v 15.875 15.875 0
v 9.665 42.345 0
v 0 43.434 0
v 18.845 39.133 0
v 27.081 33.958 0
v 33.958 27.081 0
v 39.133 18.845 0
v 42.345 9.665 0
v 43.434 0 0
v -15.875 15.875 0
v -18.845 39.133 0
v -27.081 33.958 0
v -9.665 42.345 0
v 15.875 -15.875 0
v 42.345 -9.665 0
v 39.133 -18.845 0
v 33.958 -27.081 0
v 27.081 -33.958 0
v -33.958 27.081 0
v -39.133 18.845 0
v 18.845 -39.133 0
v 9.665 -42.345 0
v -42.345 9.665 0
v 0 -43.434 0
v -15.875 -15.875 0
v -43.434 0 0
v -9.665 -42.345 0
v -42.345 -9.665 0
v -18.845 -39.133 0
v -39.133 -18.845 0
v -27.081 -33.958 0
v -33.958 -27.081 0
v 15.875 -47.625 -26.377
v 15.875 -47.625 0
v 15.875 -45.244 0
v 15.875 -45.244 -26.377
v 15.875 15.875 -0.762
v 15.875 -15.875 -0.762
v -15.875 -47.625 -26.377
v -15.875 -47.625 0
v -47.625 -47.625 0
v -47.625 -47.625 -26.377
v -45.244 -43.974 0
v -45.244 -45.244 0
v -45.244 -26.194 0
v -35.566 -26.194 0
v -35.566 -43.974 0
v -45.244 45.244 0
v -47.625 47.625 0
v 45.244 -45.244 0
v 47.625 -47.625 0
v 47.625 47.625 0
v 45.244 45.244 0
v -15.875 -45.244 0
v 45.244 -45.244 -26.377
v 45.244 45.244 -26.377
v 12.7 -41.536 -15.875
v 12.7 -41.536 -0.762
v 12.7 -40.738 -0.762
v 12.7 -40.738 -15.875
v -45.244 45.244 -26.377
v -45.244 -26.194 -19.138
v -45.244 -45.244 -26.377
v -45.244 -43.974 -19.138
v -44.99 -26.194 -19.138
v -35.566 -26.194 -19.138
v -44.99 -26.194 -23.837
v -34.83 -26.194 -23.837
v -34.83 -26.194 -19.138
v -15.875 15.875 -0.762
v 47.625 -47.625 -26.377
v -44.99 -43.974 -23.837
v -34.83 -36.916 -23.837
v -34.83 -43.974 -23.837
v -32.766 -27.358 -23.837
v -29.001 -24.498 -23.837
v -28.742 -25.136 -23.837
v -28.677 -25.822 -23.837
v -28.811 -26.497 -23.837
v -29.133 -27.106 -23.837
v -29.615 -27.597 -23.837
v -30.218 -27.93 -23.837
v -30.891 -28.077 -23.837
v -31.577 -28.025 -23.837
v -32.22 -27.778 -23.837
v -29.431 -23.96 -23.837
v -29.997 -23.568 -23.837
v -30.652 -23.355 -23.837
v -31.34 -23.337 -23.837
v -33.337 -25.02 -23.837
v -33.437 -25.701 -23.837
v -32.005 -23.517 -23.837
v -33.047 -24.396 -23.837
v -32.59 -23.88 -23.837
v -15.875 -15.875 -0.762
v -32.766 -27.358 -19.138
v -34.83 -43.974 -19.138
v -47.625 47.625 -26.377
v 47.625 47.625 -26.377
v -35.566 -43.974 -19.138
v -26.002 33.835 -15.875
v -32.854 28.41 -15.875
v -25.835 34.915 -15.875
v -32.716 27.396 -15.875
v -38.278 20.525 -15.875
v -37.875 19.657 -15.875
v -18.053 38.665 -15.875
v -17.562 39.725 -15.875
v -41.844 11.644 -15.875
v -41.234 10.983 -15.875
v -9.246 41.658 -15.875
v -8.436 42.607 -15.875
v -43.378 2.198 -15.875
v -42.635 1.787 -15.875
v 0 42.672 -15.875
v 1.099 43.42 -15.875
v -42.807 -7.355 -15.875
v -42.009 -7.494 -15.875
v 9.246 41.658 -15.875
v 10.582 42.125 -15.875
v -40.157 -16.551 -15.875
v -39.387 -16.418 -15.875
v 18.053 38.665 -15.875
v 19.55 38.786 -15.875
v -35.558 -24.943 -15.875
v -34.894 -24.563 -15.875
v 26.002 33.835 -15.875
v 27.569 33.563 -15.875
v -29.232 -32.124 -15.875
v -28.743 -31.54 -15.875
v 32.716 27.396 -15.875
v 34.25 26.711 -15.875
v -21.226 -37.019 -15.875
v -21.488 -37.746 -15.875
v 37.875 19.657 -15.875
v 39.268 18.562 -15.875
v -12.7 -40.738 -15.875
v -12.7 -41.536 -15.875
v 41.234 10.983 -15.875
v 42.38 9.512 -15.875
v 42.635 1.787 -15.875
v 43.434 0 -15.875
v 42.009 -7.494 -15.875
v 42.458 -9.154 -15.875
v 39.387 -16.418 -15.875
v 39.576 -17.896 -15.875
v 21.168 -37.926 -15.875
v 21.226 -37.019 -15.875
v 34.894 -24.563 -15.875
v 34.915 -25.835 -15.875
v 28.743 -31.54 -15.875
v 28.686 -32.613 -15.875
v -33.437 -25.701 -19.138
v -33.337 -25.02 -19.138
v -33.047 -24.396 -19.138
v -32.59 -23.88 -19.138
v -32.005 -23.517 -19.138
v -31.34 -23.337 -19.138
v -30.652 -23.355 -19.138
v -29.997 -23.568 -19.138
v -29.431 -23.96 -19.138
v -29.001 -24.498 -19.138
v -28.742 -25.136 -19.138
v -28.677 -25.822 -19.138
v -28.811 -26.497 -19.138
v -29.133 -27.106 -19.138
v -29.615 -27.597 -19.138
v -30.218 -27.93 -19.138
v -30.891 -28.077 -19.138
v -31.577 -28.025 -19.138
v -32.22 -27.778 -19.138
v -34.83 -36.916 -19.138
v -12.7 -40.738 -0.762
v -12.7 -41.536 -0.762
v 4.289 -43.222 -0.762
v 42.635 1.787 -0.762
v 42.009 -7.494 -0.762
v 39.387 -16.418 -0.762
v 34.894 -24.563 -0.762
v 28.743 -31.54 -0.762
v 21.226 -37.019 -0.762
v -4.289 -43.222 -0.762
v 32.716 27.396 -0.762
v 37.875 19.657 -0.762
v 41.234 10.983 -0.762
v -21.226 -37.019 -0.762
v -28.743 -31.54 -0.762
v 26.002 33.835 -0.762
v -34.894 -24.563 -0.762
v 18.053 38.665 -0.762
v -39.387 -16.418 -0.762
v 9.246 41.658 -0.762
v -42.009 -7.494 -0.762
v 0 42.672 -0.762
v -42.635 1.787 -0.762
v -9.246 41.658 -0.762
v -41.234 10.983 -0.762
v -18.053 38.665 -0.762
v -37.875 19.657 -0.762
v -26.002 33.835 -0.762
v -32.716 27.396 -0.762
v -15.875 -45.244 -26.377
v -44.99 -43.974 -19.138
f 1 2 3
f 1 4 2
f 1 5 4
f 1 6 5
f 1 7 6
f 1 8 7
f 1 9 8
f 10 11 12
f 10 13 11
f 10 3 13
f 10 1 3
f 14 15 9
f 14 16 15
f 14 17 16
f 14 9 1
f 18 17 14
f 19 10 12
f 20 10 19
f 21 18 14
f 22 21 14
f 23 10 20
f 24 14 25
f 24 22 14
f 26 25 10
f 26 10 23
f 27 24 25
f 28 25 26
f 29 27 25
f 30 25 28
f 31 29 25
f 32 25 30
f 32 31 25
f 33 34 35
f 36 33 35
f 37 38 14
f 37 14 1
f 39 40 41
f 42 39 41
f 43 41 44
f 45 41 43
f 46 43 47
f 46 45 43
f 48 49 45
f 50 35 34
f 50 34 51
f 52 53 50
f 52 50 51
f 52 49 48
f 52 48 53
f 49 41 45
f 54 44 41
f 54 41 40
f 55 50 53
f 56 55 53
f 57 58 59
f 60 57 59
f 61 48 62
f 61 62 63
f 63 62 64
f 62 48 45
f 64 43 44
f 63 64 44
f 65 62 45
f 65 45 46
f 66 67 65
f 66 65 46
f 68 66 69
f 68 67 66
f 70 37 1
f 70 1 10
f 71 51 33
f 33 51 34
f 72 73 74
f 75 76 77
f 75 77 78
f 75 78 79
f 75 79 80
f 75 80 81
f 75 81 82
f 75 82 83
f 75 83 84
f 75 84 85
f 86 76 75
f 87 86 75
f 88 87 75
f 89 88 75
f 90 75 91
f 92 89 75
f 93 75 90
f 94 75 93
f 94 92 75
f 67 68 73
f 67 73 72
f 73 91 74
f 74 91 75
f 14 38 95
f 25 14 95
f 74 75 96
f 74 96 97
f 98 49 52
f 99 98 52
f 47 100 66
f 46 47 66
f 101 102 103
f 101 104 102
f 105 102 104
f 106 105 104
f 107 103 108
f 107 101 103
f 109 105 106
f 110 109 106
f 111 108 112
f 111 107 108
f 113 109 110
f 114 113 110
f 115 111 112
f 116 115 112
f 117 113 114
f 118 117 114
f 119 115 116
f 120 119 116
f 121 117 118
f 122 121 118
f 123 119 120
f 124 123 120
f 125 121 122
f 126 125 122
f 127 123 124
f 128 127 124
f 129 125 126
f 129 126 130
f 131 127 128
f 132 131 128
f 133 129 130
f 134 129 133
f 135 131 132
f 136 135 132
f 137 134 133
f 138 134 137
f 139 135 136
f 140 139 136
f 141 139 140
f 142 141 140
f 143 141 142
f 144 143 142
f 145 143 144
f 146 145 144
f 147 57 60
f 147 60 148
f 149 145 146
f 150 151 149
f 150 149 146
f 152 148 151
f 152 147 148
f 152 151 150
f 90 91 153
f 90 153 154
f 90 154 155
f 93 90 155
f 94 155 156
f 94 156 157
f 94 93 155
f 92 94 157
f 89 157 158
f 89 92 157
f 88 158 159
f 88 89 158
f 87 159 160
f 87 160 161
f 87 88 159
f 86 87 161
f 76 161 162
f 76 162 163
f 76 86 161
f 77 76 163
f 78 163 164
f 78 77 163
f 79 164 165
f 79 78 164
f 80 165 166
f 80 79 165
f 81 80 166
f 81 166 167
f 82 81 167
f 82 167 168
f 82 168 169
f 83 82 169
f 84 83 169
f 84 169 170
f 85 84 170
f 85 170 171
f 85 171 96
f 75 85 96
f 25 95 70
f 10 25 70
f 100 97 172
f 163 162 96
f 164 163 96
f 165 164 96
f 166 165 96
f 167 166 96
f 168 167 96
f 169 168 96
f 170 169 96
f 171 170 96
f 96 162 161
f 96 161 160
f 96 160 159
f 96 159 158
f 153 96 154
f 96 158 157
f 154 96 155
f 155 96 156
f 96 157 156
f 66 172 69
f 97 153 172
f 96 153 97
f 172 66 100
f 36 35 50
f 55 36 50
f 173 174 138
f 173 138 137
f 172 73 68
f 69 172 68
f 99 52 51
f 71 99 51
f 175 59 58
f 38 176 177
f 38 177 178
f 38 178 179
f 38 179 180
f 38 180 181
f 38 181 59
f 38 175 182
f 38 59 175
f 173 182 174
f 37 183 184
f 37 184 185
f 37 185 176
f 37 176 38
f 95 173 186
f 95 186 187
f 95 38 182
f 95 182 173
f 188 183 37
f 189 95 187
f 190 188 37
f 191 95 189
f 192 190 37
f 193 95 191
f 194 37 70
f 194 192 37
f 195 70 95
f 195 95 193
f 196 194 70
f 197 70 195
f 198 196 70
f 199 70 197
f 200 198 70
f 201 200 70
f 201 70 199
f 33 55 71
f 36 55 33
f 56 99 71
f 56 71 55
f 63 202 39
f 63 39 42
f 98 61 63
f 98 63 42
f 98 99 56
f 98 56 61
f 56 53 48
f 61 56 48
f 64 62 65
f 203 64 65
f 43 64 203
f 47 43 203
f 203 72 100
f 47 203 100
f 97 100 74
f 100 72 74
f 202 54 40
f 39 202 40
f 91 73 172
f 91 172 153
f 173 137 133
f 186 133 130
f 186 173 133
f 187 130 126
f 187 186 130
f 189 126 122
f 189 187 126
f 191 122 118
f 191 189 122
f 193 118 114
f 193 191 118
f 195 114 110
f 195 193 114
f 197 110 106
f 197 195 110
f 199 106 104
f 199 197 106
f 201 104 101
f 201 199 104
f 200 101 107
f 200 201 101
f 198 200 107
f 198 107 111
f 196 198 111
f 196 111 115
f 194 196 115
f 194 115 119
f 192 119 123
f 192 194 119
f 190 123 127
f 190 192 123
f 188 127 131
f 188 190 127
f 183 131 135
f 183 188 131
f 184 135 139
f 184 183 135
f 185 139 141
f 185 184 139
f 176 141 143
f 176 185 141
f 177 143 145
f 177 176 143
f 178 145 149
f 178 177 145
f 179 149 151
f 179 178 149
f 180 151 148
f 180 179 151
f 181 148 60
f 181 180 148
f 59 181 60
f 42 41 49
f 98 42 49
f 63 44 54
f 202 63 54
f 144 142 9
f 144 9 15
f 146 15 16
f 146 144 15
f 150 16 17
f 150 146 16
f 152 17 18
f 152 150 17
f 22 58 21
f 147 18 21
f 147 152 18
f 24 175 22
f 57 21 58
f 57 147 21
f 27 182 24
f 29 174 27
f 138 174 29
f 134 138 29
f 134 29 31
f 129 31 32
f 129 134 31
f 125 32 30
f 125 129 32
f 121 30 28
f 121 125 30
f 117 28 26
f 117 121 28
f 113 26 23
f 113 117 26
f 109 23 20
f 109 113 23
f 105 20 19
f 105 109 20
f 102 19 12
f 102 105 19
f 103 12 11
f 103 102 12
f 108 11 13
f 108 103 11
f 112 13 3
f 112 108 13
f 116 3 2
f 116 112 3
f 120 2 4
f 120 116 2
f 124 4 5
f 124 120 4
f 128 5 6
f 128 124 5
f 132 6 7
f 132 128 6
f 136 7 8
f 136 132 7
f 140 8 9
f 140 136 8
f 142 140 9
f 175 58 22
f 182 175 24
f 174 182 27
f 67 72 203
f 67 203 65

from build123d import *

# Parameters (mm, degrees)
SKETCH3_W           = 31.75
SKETCH3_H           = 31.75
CUT_EXTRUDE1_DEPTH  = 1.762
SKETCH4_W           = 25.4
SKETCH4_H           = 50.8
CUT_EXTRUDE2_DEPTH  = 16.113
BOSS_EXTRUDE2_DEPTH = 26.376923077
BOSS_EXTRUDE3_START = -2.54
SKETCH6_W           = 10.16
SKETCH6_H           = 17.78
SKETCH6_R           = 2.38125
BOSS_EXTRUDE3_DEPTH = 4.699
SKETCH7_W           = 9.677573941
SKETCH7_H           = 17.78
BOSS_EXTRUDE4_DEPTH = 19.137923


with BuildPart() as part:
    # Sketch2 → Revolve1 (revolve)
    with BuildSketch(Plane(origin=(0, 0, 0), x_dir=(1, 0, 0), z_dir=(0, 1, 0))):
        Polygon((0, 0), (43.434, 0), (43.434, 15.875), (42.672, 15.875), (42.672, 0.762), (0, 0.762), align=None)
    revolve(axis=Axis((0, 0, 0), (0, 0, -1)))

    # Sketch3 → Cut-Extrude1 (cut, through all)
    with BuildSketch(Plane(origin=(0, 0, -0.762), x_dir=(-1, 0, 0), z_dir=(0, 0, -1))):
        Rectangle(SKETCH3_W, SKETCH3_H)
    extrude(amount=-CUT_EXTRUDE1_DEPTH, mode=Mode.SUBTRACT)

    # Sketch4 → Cut-Extrude2 (cut, through all)
    with BuildSketch(Plane(origin=(0, 0, -0.762), x_dir=(-1, 0, 0), z_dir=(0, 0, -1))):
        with Locations((0, -25.4)):
            Rectangle(SKETCH4_W, SKETCH4_H)
    extrude(amount=CUT_EXTRUDE2_DEPTH, mode=Mode.SUBTRACT)


with BuildPart() as body_2:
    # Sketch5 → Boss-Extrude2 (new body)
    with BuildSketch(Plane.XY):
        Polygon((45.24375, 45.24375), (-45.24375, 45.24375), (-45.24375, -45.24375), (-15.875, -45.24375), (-15.875, -47.625), (-47.625, -47.625), (-47.625, 47.625), (47.625, 47.625), (47.625, -47.625), (15.875, -47.625), (15.875, -45.24375), (45.24375, -45.24375), align=None)
    extrude(amount=-BOSS_EXTRUDE2_DEPTH)



with BuildPart() as body_3:
    # Sketch6 → Boss-Extrude3 (new body)
    with BuildSketch(Plane(origin=(0, 0, -26.376923077), x_dir=(-1, 0, 0), z_dir=(0, 0, -1)).offset(BOSS_EXTRUDE3_START)):
        with Locations((39.90975, -35.08375)):
            Rectangle(SKETCH6_W, SKETCH6_H)
        with Locations((31.055530123, -25.701278814)):
            Circle(SKETCH6_R)
        with BuildLine():
            Line((32.765891315, -27.358087841), (34.82975, -43.97375))
            Line((34.82975, -43.97375), (34.82975, -36.915766051))
            Line((34.82975, -36.915766051), (33.436780123, -25.701278814))
            ThreePointArc((33.436780123, -25.701278814), (33.262694497, -26.595022058), (32.765891315, -27.358087841))
        make_face()
    extrude(amount=-BOSS_EXTRUDE3_DEPTH)


with BuildPart() as body_2_1:
    add(body_2.part)

    add(body_3.part)  # Boss-Extrude4 merges body 3
    # Sketch7 → Boss-Extrude4 (add)
    with BuildSketch(Plane.XY.offset(-19.137923077)):
        with Locations((-40.40496303, -35.08375)):
            Rectangle(SKETCH7_W, SKETCH7_H)
    extrude(amount=BOSS_EXTRUDE4_DEPTH)


solid = Compound([part.part, body_2_1.part])
